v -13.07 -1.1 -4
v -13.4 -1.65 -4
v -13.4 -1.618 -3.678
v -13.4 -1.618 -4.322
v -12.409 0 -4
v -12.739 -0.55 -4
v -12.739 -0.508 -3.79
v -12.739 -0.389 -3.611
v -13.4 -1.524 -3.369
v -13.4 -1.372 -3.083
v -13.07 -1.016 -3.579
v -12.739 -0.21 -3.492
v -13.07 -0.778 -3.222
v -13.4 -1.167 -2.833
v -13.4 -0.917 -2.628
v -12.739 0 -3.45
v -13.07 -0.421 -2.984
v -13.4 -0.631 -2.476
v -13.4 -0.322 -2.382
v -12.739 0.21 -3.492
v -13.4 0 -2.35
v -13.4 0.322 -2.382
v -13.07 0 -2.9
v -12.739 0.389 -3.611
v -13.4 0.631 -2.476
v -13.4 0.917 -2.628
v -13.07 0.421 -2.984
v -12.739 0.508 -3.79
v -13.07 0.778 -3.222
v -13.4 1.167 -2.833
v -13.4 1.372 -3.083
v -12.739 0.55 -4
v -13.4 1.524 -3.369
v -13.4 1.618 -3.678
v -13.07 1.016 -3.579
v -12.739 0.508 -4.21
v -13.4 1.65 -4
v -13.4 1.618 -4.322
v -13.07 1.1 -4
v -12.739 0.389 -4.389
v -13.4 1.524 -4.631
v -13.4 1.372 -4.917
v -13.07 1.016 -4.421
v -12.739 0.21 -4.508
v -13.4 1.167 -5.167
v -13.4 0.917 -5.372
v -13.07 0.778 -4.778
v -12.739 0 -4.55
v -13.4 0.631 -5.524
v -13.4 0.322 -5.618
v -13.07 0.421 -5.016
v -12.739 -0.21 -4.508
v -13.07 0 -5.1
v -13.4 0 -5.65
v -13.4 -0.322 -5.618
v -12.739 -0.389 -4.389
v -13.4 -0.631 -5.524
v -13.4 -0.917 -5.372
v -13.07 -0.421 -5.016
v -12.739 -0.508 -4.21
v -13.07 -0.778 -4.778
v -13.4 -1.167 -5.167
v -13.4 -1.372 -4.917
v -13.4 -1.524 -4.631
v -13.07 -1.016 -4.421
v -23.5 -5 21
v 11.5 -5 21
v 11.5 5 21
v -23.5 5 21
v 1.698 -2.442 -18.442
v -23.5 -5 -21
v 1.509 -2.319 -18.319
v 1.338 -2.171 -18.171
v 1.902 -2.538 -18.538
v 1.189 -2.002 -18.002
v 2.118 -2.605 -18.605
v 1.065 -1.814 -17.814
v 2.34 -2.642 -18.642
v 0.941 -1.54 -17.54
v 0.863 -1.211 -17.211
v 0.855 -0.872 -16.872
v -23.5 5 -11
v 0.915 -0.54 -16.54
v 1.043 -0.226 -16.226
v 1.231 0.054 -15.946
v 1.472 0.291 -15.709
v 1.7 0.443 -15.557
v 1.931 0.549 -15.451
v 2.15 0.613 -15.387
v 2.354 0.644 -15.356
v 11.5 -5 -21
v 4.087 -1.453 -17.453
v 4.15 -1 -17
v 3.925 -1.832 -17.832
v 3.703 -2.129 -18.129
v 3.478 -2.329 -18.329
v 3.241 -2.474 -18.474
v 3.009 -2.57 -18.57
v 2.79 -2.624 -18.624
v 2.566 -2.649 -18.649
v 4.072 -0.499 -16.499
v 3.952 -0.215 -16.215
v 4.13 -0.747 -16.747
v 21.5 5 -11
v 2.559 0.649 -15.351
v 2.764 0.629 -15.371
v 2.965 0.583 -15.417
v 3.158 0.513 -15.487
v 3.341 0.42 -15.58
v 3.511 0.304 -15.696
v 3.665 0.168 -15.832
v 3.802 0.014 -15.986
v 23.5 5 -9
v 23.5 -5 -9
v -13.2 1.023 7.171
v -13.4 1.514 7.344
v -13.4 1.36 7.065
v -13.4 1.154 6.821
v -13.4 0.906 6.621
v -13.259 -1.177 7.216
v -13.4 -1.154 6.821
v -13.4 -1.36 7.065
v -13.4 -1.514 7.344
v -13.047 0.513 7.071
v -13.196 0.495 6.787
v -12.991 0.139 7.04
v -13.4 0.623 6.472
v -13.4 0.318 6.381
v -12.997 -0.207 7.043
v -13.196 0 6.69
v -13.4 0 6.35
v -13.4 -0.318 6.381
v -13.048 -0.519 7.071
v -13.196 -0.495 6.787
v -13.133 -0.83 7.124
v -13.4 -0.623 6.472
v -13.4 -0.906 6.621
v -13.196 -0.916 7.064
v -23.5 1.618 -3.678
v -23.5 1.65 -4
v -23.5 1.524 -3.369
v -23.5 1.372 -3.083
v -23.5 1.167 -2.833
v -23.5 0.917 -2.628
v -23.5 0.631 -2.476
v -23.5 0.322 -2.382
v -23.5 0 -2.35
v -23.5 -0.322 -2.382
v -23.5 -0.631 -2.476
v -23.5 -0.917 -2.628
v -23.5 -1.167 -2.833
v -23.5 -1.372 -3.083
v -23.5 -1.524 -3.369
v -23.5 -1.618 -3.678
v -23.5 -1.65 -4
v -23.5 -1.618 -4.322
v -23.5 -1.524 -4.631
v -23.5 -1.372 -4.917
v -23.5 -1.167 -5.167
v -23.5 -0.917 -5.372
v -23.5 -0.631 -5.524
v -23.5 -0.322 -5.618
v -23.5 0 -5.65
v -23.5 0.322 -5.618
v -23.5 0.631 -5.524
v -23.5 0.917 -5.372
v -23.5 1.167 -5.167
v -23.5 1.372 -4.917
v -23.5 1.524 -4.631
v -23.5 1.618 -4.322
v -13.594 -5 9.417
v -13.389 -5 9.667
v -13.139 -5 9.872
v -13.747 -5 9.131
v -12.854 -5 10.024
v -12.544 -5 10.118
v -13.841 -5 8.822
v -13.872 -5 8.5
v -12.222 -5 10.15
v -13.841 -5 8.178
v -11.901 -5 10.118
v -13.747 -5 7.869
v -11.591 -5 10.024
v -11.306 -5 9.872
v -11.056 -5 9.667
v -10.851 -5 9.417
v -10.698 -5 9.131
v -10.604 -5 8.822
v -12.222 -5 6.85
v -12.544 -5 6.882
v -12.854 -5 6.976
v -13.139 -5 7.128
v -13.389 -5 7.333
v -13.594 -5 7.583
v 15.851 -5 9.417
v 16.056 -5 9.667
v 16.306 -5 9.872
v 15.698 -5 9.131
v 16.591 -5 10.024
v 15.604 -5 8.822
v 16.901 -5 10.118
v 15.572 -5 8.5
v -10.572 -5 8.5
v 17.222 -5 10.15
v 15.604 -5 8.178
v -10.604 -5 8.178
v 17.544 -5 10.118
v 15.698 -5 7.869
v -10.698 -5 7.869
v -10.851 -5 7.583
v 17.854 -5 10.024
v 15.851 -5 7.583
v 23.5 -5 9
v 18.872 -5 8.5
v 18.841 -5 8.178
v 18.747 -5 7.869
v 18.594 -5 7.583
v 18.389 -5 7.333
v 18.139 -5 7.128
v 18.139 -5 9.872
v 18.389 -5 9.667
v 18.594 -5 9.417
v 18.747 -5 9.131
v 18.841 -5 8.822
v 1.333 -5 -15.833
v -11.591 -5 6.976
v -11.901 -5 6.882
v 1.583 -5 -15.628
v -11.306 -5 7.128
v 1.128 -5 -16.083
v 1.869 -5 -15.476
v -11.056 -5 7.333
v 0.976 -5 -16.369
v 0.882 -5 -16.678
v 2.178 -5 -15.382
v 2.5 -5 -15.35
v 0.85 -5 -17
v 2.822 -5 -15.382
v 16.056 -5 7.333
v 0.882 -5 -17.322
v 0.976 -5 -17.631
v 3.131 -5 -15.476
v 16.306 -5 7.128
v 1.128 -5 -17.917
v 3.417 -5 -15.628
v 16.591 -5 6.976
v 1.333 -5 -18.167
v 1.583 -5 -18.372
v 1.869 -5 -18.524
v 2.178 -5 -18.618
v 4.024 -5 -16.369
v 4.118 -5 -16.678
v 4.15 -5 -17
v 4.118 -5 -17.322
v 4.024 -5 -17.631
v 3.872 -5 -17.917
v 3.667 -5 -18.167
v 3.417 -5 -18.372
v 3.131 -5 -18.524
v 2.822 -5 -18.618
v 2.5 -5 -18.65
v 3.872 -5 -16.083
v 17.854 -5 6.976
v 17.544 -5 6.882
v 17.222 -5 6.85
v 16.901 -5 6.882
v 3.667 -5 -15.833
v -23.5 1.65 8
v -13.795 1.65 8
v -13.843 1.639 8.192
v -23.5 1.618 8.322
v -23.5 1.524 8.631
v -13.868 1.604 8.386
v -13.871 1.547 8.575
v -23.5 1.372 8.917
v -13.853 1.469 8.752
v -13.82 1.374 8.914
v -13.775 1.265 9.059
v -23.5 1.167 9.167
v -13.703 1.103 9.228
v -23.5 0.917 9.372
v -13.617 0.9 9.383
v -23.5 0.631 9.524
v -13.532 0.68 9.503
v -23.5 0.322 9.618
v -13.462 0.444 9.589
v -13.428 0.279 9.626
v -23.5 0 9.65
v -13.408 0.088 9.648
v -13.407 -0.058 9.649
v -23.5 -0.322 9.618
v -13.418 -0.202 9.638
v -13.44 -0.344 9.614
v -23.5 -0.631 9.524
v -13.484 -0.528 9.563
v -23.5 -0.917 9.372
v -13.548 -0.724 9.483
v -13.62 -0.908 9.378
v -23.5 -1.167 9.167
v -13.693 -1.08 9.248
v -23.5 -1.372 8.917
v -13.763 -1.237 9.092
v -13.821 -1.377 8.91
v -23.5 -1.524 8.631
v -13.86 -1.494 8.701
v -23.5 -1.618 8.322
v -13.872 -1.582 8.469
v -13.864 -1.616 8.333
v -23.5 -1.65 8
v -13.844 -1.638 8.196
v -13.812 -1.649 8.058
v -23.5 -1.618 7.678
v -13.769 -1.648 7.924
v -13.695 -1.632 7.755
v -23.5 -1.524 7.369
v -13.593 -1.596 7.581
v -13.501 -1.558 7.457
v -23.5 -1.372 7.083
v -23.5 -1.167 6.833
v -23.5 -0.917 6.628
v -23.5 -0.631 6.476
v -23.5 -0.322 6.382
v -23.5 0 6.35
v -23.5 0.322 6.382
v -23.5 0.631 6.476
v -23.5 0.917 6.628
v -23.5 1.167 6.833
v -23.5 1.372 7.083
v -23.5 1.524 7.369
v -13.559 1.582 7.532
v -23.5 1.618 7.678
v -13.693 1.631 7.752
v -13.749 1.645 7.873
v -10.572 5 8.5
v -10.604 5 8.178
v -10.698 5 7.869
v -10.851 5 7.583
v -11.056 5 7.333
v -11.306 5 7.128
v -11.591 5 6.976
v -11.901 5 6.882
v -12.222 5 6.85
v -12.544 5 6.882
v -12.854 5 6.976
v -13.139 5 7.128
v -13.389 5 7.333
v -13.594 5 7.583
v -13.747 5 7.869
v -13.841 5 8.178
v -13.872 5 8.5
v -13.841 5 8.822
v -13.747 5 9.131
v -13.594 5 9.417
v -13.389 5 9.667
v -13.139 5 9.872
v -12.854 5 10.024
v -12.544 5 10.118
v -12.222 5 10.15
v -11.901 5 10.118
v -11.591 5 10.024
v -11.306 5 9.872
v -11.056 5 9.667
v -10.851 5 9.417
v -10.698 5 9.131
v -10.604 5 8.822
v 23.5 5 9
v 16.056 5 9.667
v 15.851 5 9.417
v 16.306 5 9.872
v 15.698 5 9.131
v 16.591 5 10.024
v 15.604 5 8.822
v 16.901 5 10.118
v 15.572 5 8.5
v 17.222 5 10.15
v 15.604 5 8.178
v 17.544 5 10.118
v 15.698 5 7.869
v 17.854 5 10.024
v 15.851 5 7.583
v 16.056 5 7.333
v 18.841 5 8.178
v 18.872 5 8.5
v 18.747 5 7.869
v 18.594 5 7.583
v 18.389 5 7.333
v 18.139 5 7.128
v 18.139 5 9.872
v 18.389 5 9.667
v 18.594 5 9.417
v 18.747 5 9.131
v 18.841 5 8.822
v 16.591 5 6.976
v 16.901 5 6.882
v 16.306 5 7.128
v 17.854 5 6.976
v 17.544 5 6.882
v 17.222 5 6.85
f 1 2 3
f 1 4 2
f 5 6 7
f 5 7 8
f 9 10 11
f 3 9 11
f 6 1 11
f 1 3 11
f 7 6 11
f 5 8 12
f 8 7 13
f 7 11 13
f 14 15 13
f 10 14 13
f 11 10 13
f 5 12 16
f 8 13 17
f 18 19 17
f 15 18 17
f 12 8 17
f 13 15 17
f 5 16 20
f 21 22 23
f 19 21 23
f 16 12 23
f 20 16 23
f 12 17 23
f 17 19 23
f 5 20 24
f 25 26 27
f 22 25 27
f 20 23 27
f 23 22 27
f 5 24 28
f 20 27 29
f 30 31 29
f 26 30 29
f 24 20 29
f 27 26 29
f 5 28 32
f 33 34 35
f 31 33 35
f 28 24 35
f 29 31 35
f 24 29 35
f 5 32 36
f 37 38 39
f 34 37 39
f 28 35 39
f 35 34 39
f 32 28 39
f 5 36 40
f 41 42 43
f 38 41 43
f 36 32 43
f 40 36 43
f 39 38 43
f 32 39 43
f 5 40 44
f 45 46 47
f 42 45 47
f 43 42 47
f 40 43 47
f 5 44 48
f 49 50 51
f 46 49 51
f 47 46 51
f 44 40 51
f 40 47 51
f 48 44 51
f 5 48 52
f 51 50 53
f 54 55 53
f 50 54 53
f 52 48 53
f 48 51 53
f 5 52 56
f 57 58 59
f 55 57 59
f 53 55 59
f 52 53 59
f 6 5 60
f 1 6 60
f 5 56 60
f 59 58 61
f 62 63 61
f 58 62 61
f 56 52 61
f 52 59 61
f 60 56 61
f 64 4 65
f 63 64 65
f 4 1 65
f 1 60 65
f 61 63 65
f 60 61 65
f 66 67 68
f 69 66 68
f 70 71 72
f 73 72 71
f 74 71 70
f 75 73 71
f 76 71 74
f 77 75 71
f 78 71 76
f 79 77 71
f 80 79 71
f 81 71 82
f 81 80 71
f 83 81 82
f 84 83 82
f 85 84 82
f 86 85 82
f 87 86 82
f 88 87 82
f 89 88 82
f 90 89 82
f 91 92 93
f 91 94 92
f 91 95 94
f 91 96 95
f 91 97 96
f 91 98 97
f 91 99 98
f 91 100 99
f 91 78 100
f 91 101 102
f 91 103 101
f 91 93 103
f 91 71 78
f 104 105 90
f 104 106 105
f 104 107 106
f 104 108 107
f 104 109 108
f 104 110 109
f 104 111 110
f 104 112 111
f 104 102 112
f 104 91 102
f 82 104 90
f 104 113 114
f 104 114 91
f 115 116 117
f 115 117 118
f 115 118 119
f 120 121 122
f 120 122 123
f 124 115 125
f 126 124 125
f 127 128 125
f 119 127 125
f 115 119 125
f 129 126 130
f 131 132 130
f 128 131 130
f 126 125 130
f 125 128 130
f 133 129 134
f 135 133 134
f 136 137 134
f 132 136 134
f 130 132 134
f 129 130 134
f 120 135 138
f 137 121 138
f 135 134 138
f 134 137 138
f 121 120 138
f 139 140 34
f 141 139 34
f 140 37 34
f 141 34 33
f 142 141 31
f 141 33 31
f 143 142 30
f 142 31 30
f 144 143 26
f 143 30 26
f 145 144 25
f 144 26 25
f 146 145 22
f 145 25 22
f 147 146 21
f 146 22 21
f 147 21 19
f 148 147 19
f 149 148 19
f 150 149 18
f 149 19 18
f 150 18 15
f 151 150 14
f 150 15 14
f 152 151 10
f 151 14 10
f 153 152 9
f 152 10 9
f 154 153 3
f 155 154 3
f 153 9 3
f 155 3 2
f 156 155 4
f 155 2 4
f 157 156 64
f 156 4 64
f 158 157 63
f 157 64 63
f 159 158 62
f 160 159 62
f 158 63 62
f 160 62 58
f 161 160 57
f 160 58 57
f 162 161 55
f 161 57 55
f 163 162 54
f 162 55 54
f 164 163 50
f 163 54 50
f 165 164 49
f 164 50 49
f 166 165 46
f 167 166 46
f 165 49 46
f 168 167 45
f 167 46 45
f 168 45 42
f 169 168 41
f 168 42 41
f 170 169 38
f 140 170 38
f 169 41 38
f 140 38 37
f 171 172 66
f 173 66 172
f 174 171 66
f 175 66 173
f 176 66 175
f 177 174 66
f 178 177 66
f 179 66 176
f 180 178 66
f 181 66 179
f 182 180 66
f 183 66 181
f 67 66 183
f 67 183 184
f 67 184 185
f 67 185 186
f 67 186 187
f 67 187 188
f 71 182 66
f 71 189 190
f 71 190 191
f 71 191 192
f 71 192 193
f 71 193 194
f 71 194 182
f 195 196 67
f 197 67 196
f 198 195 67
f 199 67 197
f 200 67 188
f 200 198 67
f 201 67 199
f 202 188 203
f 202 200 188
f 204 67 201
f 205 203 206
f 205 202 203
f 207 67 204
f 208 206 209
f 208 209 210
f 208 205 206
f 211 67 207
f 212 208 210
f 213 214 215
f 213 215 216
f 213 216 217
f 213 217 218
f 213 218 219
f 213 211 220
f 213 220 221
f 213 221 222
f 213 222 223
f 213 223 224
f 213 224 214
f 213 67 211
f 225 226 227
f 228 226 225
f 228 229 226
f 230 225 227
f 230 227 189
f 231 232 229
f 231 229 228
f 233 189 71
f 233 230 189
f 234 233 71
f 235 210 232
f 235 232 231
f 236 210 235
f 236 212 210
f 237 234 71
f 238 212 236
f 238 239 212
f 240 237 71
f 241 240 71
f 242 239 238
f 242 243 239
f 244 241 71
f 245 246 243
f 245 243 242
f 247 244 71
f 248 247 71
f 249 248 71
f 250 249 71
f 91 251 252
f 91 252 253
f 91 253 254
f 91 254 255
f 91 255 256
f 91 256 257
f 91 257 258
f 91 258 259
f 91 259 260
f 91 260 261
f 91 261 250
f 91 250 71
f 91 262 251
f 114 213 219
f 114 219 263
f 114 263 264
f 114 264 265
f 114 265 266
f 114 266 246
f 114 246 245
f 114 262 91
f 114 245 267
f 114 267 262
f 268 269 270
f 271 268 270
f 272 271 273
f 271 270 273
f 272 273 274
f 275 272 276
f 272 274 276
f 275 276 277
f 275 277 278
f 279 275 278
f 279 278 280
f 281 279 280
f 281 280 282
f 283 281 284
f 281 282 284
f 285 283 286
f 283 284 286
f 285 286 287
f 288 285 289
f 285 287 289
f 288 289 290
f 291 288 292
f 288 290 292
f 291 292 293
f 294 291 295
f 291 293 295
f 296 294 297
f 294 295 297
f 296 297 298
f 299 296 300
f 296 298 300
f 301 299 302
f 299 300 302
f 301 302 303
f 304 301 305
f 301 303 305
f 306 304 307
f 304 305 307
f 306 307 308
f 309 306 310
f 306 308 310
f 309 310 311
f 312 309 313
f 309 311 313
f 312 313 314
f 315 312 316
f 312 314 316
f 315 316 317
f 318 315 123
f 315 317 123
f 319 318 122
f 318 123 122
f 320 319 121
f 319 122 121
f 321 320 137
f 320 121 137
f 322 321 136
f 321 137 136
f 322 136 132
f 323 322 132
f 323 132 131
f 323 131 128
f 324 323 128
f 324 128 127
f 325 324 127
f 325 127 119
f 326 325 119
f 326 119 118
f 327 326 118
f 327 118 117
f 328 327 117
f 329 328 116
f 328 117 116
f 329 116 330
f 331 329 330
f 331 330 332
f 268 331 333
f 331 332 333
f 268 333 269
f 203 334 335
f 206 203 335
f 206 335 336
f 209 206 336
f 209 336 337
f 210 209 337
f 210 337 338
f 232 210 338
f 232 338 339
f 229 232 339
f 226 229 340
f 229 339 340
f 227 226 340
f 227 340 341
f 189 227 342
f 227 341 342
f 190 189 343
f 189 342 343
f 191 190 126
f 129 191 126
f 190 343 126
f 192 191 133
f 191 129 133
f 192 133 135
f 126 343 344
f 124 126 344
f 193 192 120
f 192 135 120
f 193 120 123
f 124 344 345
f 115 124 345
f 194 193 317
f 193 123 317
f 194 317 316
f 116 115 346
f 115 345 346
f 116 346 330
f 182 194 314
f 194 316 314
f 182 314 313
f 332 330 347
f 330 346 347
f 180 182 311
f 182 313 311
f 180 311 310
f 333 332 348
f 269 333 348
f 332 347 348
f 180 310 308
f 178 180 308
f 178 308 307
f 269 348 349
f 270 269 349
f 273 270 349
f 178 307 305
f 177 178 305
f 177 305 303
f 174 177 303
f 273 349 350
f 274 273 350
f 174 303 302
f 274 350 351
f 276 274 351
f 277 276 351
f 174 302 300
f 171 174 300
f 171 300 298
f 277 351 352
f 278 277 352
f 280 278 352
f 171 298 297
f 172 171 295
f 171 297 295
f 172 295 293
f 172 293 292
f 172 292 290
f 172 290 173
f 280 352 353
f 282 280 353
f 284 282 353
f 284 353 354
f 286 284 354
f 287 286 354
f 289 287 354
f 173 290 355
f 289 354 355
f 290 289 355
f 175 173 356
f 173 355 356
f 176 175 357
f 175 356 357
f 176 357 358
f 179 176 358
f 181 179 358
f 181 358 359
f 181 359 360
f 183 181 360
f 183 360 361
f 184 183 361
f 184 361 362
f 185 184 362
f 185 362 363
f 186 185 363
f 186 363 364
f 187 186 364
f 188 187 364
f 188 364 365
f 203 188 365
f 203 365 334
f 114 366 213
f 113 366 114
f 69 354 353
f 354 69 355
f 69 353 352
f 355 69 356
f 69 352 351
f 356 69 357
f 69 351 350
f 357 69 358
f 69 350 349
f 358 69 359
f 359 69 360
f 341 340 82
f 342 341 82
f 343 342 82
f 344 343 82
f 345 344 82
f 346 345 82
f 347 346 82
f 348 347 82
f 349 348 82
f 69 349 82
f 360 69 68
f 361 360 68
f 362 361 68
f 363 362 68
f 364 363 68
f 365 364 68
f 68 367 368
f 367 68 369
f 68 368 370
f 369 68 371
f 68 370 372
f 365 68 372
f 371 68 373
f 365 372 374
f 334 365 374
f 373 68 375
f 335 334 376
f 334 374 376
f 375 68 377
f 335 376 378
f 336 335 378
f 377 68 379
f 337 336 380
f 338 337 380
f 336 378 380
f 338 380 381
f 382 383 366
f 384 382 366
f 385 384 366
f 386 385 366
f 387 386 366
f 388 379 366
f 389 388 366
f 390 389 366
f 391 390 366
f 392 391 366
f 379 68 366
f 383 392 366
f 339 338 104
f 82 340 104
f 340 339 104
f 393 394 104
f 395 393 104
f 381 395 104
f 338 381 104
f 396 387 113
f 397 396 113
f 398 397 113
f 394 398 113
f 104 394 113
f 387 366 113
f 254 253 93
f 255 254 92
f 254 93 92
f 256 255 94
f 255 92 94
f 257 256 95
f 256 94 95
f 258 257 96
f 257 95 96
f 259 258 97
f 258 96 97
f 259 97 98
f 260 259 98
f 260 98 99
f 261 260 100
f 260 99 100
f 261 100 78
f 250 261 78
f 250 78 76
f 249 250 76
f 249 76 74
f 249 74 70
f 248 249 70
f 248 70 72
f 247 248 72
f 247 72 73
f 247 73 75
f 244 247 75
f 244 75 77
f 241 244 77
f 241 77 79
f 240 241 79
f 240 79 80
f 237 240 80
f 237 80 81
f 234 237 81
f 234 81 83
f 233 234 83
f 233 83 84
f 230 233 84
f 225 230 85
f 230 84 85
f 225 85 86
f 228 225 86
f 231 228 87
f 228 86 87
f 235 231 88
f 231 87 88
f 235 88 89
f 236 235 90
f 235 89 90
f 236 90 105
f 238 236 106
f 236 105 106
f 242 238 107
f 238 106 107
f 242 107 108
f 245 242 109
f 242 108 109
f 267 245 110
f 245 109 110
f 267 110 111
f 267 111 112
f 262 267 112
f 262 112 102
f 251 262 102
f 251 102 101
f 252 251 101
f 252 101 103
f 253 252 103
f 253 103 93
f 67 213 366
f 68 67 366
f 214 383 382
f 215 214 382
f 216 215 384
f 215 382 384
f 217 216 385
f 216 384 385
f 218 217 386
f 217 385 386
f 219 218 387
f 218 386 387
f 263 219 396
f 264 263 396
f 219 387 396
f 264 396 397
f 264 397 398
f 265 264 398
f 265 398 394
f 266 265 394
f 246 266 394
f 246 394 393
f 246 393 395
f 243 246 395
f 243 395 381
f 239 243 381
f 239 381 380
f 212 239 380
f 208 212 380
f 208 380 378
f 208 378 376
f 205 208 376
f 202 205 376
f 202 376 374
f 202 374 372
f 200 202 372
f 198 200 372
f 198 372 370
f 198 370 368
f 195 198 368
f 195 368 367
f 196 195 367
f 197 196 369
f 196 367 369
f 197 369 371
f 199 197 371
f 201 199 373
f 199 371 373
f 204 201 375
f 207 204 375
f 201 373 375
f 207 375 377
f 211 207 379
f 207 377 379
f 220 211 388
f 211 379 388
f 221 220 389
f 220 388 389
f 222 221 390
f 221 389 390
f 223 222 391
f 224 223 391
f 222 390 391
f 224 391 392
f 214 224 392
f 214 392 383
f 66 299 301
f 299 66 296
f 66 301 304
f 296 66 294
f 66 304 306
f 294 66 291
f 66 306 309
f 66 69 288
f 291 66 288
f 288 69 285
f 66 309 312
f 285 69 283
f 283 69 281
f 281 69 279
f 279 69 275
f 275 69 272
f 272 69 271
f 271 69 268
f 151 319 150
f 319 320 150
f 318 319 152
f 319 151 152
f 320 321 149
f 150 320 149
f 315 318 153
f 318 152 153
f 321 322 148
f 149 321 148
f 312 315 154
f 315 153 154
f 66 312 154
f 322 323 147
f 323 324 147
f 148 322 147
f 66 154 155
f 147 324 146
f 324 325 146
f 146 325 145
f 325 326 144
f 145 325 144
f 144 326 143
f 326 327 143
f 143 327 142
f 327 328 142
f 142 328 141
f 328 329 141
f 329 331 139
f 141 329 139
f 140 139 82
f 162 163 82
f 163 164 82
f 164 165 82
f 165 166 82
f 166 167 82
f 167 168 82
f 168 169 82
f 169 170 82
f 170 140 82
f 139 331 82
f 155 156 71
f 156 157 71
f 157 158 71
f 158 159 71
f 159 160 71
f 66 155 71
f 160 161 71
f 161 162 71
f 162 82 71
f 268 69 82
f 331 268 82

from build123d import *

# Parameters (mm, degrees)
SKETCH_1_W             = 42
SKETCH_1_H             = 10
EXTRUDE_1_DEPTH        = 23.5
CUT_EXTRUDE_1_DEPTH    = 52.720402164
HOLE_WIZARD_M4_2_D     = 3.3
HOLE_WIZARD_M4_2_DEPTH = 10.1
HOLE_WIZARD_M4_2_TIP   = 0.991420021
HOLE_WIZARD_M4_1_D     = 3.3
CHAMFER_4_SIZE         = 12
CUT_EXTRUDE_3_DEPTH    = 34.064331336


with BuildPart() as part:
    # 草图1 → 凸台-拉伸1 (new, symmetric)
    with BuildSketch(Plane(origin=(0, 0, 0), x_dir=(0, 0, -1), z_dir=(1, 0, 0))):
        Rectangle(SKETCH_1_W, SKETCH_1_H)
    extrude(amount=EXTRUDE_1_DEPTH, both=True)

    # 草图2 → 切除-拉伸1 (cut, through all)
    with BuildSketch(Plane(origin=(23.5, 0, 0), x_dir=(0, 0, -1), z_dir=(1, 0, 0))):
        Polygon((21, -5), (11, 5), (21, 5), align=None)
    extrude(amount=-CUT_EXTRUDE_1_DEPTH, mode=Mode.SUBTRACT)

    # M4 螺纹孔2
    with Locations(Plane(origin=(-23.5, -27.863076326, 2.458563873), x_dir=(0, -1, 0), z_dir=(-1, 0, 0))):
        with Locations((-27.863076326, 5.541436127), (-27.863076326, -6.458563873)):
            Hole(HOLE_WIZARD_M4_2_D / 2, depth=HOLE_WIZARD_M4_2_DEPTH)
            with Locations((0, 0, -(HOLE_WIZARD_M4_2_DEPTH + HOLE_WIZARD_M4_2_TIP / 2))):  # 118° drill point
                Cone(0, HOLE_WIZARD_M4_2_D / 2, HOLE_WIZARD_M4_2_TIP, mode=Mode.SUBTRACT)

    # M4 螺纹孔1 (through all)
    with Locations(Plane(origin=(0, -5, 0), x_dir=(-1, 0, 0), z_dir=(0, -1, 0))):
        with Locations((-2.5, 17), (-17.222431864, -8.5), (12.222431864, -8.5)):
            Hole(HOLE_WIZARD_M4_1_D / 2)

    # 倒角4
    chamfer_4_edges = [part.edges().sort_by_distance(p)[0] for p in [
        (23.5, 0, 21),
    ]]
    chamfer(chamfer_4_edges, length=CHAMFER_4_SIZE)

    # 草图8 → 切除-拉伸3 (cut, through all)
    with BuildSketch(Plane.XZ.offset(5)):
        Polygon((23.5, -9), (11.5, -21), (23.5, -21), align=None)
    extrude(amount=-CUT_EXTRUDE_3_DEPTH, mode=Mode.SUBTRACT)


solid = part.part
